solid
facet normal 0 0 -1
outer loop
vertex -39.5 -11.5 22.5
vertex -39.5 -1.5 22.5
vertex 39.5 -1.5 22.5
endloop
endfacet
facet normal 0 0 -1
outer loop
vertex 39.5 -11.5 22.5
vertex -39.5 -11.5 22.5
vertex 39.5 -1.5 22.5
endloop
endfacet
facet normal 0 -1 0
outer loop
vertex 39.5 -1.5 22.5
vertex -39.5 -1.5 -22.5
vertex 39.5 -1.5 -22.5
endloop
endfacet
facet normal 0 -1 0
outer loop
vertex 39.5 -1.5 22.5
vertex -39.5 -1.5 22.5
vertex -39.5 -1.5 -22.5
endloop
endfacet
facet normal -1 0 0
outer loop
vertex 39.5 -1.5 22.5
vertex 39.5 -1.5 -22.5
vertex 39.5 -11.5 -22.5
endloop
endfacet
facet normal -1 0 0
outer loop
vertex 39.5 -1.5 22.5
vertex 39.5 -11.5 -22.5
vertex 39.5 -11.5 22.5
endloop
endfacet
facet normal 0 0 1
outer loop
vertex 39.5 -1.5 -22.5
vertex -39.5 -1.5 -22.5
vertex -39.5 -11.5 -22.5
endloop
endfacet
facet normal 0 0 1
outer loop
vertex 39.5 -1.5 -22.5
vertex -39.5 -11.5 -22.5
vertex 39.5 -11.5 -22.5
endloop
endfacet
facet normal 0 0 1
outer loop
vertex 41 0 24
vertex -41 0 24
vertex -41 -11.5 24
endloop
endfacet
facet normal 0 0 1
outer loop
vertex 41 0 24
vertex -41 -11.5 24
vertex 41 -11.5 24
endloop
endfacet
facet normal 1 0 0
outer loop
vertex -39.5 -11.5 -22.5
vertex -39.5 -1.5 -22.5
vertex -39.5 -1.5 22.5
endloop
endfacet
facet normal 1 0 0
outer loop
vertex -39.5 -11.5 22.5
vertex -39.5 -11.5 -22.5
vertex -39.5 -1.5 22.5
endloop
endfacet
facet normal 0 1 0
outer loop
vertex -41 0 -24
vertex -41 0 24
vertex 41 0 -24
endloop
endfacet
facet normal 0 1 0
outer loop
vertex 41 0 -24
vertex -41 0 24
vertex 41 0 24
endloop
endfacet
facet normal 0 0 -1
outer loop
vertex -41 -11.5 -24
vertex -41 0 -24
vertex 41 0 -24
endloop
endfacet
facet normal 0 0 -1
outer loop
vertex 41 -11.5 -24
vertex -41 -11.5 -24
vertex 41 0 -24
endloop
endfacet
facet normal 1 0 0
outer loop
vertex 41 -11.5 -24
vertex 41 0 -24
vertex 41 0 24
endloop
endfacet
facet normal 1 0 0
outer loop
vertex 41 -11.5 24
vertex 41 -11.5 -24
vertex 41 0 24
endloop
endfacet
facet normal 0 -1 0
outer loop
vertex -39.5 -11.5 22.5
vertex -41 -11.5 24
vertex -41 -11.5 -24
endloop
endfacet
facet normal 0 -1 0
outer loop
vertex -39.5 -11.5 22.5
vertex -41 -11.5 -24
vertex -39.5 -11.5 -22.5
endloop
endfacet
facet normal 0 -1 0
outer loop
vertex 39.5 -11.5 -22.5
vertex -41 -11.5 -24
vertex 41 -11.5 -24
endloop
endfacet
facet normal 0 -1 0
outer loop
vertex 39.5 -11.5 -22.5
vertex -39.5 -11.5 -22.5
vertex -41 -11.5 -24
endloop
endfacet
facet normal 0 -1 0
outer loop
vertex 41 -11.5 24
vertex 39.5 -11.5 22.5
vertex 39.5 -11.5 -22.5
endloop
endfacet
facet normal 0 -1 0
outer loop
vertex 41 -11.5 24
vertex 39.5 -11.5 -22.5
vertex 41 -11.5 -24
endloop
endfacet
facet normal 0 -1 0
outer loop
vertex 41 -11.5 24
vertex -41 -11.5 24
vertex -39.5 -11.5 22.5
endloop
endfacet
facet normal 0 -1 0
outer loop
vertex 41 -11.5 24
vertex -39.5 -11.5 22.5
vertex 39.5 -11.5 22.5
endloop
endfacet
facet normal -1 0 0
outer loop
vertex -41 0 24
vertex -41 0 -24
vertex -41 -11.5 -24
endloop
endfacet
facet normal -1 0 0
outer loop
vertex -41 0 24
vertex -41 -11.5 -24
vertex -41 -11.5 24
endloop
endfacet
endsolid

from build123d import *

# Parameters (mm, degrees)
F0_W     = 82
F0_H     = 48
F0_W_2   = 79
F0_H_2   = 45
F1_DEPTH = 1.5
F2_DEPTH = 11.5


with BuildPart() as f1:
    # F0 (on Front) → F1 (new body)
    with BuildSketch(Plane.XZ):
        Rectangle(F0_W, F0_H)
        Rectangle(F0_W_2, F0_H_2, mode=Mode.SUBTRACT)
        Rectangle(F0_W_2, F0_H_2)
    extrude(amount=F1_DEPTH)

    # F0 (on Front) → F2 (join)
    with BuildSketch(Plane.XZ):
        Rectangle(F0_W, F0_H)
        Rectangle(F0_W_2, F0_H_2, mode=Mode.SUBTRACT)
    extrude(amount=F2_DEPTH)


solid = f1.part
